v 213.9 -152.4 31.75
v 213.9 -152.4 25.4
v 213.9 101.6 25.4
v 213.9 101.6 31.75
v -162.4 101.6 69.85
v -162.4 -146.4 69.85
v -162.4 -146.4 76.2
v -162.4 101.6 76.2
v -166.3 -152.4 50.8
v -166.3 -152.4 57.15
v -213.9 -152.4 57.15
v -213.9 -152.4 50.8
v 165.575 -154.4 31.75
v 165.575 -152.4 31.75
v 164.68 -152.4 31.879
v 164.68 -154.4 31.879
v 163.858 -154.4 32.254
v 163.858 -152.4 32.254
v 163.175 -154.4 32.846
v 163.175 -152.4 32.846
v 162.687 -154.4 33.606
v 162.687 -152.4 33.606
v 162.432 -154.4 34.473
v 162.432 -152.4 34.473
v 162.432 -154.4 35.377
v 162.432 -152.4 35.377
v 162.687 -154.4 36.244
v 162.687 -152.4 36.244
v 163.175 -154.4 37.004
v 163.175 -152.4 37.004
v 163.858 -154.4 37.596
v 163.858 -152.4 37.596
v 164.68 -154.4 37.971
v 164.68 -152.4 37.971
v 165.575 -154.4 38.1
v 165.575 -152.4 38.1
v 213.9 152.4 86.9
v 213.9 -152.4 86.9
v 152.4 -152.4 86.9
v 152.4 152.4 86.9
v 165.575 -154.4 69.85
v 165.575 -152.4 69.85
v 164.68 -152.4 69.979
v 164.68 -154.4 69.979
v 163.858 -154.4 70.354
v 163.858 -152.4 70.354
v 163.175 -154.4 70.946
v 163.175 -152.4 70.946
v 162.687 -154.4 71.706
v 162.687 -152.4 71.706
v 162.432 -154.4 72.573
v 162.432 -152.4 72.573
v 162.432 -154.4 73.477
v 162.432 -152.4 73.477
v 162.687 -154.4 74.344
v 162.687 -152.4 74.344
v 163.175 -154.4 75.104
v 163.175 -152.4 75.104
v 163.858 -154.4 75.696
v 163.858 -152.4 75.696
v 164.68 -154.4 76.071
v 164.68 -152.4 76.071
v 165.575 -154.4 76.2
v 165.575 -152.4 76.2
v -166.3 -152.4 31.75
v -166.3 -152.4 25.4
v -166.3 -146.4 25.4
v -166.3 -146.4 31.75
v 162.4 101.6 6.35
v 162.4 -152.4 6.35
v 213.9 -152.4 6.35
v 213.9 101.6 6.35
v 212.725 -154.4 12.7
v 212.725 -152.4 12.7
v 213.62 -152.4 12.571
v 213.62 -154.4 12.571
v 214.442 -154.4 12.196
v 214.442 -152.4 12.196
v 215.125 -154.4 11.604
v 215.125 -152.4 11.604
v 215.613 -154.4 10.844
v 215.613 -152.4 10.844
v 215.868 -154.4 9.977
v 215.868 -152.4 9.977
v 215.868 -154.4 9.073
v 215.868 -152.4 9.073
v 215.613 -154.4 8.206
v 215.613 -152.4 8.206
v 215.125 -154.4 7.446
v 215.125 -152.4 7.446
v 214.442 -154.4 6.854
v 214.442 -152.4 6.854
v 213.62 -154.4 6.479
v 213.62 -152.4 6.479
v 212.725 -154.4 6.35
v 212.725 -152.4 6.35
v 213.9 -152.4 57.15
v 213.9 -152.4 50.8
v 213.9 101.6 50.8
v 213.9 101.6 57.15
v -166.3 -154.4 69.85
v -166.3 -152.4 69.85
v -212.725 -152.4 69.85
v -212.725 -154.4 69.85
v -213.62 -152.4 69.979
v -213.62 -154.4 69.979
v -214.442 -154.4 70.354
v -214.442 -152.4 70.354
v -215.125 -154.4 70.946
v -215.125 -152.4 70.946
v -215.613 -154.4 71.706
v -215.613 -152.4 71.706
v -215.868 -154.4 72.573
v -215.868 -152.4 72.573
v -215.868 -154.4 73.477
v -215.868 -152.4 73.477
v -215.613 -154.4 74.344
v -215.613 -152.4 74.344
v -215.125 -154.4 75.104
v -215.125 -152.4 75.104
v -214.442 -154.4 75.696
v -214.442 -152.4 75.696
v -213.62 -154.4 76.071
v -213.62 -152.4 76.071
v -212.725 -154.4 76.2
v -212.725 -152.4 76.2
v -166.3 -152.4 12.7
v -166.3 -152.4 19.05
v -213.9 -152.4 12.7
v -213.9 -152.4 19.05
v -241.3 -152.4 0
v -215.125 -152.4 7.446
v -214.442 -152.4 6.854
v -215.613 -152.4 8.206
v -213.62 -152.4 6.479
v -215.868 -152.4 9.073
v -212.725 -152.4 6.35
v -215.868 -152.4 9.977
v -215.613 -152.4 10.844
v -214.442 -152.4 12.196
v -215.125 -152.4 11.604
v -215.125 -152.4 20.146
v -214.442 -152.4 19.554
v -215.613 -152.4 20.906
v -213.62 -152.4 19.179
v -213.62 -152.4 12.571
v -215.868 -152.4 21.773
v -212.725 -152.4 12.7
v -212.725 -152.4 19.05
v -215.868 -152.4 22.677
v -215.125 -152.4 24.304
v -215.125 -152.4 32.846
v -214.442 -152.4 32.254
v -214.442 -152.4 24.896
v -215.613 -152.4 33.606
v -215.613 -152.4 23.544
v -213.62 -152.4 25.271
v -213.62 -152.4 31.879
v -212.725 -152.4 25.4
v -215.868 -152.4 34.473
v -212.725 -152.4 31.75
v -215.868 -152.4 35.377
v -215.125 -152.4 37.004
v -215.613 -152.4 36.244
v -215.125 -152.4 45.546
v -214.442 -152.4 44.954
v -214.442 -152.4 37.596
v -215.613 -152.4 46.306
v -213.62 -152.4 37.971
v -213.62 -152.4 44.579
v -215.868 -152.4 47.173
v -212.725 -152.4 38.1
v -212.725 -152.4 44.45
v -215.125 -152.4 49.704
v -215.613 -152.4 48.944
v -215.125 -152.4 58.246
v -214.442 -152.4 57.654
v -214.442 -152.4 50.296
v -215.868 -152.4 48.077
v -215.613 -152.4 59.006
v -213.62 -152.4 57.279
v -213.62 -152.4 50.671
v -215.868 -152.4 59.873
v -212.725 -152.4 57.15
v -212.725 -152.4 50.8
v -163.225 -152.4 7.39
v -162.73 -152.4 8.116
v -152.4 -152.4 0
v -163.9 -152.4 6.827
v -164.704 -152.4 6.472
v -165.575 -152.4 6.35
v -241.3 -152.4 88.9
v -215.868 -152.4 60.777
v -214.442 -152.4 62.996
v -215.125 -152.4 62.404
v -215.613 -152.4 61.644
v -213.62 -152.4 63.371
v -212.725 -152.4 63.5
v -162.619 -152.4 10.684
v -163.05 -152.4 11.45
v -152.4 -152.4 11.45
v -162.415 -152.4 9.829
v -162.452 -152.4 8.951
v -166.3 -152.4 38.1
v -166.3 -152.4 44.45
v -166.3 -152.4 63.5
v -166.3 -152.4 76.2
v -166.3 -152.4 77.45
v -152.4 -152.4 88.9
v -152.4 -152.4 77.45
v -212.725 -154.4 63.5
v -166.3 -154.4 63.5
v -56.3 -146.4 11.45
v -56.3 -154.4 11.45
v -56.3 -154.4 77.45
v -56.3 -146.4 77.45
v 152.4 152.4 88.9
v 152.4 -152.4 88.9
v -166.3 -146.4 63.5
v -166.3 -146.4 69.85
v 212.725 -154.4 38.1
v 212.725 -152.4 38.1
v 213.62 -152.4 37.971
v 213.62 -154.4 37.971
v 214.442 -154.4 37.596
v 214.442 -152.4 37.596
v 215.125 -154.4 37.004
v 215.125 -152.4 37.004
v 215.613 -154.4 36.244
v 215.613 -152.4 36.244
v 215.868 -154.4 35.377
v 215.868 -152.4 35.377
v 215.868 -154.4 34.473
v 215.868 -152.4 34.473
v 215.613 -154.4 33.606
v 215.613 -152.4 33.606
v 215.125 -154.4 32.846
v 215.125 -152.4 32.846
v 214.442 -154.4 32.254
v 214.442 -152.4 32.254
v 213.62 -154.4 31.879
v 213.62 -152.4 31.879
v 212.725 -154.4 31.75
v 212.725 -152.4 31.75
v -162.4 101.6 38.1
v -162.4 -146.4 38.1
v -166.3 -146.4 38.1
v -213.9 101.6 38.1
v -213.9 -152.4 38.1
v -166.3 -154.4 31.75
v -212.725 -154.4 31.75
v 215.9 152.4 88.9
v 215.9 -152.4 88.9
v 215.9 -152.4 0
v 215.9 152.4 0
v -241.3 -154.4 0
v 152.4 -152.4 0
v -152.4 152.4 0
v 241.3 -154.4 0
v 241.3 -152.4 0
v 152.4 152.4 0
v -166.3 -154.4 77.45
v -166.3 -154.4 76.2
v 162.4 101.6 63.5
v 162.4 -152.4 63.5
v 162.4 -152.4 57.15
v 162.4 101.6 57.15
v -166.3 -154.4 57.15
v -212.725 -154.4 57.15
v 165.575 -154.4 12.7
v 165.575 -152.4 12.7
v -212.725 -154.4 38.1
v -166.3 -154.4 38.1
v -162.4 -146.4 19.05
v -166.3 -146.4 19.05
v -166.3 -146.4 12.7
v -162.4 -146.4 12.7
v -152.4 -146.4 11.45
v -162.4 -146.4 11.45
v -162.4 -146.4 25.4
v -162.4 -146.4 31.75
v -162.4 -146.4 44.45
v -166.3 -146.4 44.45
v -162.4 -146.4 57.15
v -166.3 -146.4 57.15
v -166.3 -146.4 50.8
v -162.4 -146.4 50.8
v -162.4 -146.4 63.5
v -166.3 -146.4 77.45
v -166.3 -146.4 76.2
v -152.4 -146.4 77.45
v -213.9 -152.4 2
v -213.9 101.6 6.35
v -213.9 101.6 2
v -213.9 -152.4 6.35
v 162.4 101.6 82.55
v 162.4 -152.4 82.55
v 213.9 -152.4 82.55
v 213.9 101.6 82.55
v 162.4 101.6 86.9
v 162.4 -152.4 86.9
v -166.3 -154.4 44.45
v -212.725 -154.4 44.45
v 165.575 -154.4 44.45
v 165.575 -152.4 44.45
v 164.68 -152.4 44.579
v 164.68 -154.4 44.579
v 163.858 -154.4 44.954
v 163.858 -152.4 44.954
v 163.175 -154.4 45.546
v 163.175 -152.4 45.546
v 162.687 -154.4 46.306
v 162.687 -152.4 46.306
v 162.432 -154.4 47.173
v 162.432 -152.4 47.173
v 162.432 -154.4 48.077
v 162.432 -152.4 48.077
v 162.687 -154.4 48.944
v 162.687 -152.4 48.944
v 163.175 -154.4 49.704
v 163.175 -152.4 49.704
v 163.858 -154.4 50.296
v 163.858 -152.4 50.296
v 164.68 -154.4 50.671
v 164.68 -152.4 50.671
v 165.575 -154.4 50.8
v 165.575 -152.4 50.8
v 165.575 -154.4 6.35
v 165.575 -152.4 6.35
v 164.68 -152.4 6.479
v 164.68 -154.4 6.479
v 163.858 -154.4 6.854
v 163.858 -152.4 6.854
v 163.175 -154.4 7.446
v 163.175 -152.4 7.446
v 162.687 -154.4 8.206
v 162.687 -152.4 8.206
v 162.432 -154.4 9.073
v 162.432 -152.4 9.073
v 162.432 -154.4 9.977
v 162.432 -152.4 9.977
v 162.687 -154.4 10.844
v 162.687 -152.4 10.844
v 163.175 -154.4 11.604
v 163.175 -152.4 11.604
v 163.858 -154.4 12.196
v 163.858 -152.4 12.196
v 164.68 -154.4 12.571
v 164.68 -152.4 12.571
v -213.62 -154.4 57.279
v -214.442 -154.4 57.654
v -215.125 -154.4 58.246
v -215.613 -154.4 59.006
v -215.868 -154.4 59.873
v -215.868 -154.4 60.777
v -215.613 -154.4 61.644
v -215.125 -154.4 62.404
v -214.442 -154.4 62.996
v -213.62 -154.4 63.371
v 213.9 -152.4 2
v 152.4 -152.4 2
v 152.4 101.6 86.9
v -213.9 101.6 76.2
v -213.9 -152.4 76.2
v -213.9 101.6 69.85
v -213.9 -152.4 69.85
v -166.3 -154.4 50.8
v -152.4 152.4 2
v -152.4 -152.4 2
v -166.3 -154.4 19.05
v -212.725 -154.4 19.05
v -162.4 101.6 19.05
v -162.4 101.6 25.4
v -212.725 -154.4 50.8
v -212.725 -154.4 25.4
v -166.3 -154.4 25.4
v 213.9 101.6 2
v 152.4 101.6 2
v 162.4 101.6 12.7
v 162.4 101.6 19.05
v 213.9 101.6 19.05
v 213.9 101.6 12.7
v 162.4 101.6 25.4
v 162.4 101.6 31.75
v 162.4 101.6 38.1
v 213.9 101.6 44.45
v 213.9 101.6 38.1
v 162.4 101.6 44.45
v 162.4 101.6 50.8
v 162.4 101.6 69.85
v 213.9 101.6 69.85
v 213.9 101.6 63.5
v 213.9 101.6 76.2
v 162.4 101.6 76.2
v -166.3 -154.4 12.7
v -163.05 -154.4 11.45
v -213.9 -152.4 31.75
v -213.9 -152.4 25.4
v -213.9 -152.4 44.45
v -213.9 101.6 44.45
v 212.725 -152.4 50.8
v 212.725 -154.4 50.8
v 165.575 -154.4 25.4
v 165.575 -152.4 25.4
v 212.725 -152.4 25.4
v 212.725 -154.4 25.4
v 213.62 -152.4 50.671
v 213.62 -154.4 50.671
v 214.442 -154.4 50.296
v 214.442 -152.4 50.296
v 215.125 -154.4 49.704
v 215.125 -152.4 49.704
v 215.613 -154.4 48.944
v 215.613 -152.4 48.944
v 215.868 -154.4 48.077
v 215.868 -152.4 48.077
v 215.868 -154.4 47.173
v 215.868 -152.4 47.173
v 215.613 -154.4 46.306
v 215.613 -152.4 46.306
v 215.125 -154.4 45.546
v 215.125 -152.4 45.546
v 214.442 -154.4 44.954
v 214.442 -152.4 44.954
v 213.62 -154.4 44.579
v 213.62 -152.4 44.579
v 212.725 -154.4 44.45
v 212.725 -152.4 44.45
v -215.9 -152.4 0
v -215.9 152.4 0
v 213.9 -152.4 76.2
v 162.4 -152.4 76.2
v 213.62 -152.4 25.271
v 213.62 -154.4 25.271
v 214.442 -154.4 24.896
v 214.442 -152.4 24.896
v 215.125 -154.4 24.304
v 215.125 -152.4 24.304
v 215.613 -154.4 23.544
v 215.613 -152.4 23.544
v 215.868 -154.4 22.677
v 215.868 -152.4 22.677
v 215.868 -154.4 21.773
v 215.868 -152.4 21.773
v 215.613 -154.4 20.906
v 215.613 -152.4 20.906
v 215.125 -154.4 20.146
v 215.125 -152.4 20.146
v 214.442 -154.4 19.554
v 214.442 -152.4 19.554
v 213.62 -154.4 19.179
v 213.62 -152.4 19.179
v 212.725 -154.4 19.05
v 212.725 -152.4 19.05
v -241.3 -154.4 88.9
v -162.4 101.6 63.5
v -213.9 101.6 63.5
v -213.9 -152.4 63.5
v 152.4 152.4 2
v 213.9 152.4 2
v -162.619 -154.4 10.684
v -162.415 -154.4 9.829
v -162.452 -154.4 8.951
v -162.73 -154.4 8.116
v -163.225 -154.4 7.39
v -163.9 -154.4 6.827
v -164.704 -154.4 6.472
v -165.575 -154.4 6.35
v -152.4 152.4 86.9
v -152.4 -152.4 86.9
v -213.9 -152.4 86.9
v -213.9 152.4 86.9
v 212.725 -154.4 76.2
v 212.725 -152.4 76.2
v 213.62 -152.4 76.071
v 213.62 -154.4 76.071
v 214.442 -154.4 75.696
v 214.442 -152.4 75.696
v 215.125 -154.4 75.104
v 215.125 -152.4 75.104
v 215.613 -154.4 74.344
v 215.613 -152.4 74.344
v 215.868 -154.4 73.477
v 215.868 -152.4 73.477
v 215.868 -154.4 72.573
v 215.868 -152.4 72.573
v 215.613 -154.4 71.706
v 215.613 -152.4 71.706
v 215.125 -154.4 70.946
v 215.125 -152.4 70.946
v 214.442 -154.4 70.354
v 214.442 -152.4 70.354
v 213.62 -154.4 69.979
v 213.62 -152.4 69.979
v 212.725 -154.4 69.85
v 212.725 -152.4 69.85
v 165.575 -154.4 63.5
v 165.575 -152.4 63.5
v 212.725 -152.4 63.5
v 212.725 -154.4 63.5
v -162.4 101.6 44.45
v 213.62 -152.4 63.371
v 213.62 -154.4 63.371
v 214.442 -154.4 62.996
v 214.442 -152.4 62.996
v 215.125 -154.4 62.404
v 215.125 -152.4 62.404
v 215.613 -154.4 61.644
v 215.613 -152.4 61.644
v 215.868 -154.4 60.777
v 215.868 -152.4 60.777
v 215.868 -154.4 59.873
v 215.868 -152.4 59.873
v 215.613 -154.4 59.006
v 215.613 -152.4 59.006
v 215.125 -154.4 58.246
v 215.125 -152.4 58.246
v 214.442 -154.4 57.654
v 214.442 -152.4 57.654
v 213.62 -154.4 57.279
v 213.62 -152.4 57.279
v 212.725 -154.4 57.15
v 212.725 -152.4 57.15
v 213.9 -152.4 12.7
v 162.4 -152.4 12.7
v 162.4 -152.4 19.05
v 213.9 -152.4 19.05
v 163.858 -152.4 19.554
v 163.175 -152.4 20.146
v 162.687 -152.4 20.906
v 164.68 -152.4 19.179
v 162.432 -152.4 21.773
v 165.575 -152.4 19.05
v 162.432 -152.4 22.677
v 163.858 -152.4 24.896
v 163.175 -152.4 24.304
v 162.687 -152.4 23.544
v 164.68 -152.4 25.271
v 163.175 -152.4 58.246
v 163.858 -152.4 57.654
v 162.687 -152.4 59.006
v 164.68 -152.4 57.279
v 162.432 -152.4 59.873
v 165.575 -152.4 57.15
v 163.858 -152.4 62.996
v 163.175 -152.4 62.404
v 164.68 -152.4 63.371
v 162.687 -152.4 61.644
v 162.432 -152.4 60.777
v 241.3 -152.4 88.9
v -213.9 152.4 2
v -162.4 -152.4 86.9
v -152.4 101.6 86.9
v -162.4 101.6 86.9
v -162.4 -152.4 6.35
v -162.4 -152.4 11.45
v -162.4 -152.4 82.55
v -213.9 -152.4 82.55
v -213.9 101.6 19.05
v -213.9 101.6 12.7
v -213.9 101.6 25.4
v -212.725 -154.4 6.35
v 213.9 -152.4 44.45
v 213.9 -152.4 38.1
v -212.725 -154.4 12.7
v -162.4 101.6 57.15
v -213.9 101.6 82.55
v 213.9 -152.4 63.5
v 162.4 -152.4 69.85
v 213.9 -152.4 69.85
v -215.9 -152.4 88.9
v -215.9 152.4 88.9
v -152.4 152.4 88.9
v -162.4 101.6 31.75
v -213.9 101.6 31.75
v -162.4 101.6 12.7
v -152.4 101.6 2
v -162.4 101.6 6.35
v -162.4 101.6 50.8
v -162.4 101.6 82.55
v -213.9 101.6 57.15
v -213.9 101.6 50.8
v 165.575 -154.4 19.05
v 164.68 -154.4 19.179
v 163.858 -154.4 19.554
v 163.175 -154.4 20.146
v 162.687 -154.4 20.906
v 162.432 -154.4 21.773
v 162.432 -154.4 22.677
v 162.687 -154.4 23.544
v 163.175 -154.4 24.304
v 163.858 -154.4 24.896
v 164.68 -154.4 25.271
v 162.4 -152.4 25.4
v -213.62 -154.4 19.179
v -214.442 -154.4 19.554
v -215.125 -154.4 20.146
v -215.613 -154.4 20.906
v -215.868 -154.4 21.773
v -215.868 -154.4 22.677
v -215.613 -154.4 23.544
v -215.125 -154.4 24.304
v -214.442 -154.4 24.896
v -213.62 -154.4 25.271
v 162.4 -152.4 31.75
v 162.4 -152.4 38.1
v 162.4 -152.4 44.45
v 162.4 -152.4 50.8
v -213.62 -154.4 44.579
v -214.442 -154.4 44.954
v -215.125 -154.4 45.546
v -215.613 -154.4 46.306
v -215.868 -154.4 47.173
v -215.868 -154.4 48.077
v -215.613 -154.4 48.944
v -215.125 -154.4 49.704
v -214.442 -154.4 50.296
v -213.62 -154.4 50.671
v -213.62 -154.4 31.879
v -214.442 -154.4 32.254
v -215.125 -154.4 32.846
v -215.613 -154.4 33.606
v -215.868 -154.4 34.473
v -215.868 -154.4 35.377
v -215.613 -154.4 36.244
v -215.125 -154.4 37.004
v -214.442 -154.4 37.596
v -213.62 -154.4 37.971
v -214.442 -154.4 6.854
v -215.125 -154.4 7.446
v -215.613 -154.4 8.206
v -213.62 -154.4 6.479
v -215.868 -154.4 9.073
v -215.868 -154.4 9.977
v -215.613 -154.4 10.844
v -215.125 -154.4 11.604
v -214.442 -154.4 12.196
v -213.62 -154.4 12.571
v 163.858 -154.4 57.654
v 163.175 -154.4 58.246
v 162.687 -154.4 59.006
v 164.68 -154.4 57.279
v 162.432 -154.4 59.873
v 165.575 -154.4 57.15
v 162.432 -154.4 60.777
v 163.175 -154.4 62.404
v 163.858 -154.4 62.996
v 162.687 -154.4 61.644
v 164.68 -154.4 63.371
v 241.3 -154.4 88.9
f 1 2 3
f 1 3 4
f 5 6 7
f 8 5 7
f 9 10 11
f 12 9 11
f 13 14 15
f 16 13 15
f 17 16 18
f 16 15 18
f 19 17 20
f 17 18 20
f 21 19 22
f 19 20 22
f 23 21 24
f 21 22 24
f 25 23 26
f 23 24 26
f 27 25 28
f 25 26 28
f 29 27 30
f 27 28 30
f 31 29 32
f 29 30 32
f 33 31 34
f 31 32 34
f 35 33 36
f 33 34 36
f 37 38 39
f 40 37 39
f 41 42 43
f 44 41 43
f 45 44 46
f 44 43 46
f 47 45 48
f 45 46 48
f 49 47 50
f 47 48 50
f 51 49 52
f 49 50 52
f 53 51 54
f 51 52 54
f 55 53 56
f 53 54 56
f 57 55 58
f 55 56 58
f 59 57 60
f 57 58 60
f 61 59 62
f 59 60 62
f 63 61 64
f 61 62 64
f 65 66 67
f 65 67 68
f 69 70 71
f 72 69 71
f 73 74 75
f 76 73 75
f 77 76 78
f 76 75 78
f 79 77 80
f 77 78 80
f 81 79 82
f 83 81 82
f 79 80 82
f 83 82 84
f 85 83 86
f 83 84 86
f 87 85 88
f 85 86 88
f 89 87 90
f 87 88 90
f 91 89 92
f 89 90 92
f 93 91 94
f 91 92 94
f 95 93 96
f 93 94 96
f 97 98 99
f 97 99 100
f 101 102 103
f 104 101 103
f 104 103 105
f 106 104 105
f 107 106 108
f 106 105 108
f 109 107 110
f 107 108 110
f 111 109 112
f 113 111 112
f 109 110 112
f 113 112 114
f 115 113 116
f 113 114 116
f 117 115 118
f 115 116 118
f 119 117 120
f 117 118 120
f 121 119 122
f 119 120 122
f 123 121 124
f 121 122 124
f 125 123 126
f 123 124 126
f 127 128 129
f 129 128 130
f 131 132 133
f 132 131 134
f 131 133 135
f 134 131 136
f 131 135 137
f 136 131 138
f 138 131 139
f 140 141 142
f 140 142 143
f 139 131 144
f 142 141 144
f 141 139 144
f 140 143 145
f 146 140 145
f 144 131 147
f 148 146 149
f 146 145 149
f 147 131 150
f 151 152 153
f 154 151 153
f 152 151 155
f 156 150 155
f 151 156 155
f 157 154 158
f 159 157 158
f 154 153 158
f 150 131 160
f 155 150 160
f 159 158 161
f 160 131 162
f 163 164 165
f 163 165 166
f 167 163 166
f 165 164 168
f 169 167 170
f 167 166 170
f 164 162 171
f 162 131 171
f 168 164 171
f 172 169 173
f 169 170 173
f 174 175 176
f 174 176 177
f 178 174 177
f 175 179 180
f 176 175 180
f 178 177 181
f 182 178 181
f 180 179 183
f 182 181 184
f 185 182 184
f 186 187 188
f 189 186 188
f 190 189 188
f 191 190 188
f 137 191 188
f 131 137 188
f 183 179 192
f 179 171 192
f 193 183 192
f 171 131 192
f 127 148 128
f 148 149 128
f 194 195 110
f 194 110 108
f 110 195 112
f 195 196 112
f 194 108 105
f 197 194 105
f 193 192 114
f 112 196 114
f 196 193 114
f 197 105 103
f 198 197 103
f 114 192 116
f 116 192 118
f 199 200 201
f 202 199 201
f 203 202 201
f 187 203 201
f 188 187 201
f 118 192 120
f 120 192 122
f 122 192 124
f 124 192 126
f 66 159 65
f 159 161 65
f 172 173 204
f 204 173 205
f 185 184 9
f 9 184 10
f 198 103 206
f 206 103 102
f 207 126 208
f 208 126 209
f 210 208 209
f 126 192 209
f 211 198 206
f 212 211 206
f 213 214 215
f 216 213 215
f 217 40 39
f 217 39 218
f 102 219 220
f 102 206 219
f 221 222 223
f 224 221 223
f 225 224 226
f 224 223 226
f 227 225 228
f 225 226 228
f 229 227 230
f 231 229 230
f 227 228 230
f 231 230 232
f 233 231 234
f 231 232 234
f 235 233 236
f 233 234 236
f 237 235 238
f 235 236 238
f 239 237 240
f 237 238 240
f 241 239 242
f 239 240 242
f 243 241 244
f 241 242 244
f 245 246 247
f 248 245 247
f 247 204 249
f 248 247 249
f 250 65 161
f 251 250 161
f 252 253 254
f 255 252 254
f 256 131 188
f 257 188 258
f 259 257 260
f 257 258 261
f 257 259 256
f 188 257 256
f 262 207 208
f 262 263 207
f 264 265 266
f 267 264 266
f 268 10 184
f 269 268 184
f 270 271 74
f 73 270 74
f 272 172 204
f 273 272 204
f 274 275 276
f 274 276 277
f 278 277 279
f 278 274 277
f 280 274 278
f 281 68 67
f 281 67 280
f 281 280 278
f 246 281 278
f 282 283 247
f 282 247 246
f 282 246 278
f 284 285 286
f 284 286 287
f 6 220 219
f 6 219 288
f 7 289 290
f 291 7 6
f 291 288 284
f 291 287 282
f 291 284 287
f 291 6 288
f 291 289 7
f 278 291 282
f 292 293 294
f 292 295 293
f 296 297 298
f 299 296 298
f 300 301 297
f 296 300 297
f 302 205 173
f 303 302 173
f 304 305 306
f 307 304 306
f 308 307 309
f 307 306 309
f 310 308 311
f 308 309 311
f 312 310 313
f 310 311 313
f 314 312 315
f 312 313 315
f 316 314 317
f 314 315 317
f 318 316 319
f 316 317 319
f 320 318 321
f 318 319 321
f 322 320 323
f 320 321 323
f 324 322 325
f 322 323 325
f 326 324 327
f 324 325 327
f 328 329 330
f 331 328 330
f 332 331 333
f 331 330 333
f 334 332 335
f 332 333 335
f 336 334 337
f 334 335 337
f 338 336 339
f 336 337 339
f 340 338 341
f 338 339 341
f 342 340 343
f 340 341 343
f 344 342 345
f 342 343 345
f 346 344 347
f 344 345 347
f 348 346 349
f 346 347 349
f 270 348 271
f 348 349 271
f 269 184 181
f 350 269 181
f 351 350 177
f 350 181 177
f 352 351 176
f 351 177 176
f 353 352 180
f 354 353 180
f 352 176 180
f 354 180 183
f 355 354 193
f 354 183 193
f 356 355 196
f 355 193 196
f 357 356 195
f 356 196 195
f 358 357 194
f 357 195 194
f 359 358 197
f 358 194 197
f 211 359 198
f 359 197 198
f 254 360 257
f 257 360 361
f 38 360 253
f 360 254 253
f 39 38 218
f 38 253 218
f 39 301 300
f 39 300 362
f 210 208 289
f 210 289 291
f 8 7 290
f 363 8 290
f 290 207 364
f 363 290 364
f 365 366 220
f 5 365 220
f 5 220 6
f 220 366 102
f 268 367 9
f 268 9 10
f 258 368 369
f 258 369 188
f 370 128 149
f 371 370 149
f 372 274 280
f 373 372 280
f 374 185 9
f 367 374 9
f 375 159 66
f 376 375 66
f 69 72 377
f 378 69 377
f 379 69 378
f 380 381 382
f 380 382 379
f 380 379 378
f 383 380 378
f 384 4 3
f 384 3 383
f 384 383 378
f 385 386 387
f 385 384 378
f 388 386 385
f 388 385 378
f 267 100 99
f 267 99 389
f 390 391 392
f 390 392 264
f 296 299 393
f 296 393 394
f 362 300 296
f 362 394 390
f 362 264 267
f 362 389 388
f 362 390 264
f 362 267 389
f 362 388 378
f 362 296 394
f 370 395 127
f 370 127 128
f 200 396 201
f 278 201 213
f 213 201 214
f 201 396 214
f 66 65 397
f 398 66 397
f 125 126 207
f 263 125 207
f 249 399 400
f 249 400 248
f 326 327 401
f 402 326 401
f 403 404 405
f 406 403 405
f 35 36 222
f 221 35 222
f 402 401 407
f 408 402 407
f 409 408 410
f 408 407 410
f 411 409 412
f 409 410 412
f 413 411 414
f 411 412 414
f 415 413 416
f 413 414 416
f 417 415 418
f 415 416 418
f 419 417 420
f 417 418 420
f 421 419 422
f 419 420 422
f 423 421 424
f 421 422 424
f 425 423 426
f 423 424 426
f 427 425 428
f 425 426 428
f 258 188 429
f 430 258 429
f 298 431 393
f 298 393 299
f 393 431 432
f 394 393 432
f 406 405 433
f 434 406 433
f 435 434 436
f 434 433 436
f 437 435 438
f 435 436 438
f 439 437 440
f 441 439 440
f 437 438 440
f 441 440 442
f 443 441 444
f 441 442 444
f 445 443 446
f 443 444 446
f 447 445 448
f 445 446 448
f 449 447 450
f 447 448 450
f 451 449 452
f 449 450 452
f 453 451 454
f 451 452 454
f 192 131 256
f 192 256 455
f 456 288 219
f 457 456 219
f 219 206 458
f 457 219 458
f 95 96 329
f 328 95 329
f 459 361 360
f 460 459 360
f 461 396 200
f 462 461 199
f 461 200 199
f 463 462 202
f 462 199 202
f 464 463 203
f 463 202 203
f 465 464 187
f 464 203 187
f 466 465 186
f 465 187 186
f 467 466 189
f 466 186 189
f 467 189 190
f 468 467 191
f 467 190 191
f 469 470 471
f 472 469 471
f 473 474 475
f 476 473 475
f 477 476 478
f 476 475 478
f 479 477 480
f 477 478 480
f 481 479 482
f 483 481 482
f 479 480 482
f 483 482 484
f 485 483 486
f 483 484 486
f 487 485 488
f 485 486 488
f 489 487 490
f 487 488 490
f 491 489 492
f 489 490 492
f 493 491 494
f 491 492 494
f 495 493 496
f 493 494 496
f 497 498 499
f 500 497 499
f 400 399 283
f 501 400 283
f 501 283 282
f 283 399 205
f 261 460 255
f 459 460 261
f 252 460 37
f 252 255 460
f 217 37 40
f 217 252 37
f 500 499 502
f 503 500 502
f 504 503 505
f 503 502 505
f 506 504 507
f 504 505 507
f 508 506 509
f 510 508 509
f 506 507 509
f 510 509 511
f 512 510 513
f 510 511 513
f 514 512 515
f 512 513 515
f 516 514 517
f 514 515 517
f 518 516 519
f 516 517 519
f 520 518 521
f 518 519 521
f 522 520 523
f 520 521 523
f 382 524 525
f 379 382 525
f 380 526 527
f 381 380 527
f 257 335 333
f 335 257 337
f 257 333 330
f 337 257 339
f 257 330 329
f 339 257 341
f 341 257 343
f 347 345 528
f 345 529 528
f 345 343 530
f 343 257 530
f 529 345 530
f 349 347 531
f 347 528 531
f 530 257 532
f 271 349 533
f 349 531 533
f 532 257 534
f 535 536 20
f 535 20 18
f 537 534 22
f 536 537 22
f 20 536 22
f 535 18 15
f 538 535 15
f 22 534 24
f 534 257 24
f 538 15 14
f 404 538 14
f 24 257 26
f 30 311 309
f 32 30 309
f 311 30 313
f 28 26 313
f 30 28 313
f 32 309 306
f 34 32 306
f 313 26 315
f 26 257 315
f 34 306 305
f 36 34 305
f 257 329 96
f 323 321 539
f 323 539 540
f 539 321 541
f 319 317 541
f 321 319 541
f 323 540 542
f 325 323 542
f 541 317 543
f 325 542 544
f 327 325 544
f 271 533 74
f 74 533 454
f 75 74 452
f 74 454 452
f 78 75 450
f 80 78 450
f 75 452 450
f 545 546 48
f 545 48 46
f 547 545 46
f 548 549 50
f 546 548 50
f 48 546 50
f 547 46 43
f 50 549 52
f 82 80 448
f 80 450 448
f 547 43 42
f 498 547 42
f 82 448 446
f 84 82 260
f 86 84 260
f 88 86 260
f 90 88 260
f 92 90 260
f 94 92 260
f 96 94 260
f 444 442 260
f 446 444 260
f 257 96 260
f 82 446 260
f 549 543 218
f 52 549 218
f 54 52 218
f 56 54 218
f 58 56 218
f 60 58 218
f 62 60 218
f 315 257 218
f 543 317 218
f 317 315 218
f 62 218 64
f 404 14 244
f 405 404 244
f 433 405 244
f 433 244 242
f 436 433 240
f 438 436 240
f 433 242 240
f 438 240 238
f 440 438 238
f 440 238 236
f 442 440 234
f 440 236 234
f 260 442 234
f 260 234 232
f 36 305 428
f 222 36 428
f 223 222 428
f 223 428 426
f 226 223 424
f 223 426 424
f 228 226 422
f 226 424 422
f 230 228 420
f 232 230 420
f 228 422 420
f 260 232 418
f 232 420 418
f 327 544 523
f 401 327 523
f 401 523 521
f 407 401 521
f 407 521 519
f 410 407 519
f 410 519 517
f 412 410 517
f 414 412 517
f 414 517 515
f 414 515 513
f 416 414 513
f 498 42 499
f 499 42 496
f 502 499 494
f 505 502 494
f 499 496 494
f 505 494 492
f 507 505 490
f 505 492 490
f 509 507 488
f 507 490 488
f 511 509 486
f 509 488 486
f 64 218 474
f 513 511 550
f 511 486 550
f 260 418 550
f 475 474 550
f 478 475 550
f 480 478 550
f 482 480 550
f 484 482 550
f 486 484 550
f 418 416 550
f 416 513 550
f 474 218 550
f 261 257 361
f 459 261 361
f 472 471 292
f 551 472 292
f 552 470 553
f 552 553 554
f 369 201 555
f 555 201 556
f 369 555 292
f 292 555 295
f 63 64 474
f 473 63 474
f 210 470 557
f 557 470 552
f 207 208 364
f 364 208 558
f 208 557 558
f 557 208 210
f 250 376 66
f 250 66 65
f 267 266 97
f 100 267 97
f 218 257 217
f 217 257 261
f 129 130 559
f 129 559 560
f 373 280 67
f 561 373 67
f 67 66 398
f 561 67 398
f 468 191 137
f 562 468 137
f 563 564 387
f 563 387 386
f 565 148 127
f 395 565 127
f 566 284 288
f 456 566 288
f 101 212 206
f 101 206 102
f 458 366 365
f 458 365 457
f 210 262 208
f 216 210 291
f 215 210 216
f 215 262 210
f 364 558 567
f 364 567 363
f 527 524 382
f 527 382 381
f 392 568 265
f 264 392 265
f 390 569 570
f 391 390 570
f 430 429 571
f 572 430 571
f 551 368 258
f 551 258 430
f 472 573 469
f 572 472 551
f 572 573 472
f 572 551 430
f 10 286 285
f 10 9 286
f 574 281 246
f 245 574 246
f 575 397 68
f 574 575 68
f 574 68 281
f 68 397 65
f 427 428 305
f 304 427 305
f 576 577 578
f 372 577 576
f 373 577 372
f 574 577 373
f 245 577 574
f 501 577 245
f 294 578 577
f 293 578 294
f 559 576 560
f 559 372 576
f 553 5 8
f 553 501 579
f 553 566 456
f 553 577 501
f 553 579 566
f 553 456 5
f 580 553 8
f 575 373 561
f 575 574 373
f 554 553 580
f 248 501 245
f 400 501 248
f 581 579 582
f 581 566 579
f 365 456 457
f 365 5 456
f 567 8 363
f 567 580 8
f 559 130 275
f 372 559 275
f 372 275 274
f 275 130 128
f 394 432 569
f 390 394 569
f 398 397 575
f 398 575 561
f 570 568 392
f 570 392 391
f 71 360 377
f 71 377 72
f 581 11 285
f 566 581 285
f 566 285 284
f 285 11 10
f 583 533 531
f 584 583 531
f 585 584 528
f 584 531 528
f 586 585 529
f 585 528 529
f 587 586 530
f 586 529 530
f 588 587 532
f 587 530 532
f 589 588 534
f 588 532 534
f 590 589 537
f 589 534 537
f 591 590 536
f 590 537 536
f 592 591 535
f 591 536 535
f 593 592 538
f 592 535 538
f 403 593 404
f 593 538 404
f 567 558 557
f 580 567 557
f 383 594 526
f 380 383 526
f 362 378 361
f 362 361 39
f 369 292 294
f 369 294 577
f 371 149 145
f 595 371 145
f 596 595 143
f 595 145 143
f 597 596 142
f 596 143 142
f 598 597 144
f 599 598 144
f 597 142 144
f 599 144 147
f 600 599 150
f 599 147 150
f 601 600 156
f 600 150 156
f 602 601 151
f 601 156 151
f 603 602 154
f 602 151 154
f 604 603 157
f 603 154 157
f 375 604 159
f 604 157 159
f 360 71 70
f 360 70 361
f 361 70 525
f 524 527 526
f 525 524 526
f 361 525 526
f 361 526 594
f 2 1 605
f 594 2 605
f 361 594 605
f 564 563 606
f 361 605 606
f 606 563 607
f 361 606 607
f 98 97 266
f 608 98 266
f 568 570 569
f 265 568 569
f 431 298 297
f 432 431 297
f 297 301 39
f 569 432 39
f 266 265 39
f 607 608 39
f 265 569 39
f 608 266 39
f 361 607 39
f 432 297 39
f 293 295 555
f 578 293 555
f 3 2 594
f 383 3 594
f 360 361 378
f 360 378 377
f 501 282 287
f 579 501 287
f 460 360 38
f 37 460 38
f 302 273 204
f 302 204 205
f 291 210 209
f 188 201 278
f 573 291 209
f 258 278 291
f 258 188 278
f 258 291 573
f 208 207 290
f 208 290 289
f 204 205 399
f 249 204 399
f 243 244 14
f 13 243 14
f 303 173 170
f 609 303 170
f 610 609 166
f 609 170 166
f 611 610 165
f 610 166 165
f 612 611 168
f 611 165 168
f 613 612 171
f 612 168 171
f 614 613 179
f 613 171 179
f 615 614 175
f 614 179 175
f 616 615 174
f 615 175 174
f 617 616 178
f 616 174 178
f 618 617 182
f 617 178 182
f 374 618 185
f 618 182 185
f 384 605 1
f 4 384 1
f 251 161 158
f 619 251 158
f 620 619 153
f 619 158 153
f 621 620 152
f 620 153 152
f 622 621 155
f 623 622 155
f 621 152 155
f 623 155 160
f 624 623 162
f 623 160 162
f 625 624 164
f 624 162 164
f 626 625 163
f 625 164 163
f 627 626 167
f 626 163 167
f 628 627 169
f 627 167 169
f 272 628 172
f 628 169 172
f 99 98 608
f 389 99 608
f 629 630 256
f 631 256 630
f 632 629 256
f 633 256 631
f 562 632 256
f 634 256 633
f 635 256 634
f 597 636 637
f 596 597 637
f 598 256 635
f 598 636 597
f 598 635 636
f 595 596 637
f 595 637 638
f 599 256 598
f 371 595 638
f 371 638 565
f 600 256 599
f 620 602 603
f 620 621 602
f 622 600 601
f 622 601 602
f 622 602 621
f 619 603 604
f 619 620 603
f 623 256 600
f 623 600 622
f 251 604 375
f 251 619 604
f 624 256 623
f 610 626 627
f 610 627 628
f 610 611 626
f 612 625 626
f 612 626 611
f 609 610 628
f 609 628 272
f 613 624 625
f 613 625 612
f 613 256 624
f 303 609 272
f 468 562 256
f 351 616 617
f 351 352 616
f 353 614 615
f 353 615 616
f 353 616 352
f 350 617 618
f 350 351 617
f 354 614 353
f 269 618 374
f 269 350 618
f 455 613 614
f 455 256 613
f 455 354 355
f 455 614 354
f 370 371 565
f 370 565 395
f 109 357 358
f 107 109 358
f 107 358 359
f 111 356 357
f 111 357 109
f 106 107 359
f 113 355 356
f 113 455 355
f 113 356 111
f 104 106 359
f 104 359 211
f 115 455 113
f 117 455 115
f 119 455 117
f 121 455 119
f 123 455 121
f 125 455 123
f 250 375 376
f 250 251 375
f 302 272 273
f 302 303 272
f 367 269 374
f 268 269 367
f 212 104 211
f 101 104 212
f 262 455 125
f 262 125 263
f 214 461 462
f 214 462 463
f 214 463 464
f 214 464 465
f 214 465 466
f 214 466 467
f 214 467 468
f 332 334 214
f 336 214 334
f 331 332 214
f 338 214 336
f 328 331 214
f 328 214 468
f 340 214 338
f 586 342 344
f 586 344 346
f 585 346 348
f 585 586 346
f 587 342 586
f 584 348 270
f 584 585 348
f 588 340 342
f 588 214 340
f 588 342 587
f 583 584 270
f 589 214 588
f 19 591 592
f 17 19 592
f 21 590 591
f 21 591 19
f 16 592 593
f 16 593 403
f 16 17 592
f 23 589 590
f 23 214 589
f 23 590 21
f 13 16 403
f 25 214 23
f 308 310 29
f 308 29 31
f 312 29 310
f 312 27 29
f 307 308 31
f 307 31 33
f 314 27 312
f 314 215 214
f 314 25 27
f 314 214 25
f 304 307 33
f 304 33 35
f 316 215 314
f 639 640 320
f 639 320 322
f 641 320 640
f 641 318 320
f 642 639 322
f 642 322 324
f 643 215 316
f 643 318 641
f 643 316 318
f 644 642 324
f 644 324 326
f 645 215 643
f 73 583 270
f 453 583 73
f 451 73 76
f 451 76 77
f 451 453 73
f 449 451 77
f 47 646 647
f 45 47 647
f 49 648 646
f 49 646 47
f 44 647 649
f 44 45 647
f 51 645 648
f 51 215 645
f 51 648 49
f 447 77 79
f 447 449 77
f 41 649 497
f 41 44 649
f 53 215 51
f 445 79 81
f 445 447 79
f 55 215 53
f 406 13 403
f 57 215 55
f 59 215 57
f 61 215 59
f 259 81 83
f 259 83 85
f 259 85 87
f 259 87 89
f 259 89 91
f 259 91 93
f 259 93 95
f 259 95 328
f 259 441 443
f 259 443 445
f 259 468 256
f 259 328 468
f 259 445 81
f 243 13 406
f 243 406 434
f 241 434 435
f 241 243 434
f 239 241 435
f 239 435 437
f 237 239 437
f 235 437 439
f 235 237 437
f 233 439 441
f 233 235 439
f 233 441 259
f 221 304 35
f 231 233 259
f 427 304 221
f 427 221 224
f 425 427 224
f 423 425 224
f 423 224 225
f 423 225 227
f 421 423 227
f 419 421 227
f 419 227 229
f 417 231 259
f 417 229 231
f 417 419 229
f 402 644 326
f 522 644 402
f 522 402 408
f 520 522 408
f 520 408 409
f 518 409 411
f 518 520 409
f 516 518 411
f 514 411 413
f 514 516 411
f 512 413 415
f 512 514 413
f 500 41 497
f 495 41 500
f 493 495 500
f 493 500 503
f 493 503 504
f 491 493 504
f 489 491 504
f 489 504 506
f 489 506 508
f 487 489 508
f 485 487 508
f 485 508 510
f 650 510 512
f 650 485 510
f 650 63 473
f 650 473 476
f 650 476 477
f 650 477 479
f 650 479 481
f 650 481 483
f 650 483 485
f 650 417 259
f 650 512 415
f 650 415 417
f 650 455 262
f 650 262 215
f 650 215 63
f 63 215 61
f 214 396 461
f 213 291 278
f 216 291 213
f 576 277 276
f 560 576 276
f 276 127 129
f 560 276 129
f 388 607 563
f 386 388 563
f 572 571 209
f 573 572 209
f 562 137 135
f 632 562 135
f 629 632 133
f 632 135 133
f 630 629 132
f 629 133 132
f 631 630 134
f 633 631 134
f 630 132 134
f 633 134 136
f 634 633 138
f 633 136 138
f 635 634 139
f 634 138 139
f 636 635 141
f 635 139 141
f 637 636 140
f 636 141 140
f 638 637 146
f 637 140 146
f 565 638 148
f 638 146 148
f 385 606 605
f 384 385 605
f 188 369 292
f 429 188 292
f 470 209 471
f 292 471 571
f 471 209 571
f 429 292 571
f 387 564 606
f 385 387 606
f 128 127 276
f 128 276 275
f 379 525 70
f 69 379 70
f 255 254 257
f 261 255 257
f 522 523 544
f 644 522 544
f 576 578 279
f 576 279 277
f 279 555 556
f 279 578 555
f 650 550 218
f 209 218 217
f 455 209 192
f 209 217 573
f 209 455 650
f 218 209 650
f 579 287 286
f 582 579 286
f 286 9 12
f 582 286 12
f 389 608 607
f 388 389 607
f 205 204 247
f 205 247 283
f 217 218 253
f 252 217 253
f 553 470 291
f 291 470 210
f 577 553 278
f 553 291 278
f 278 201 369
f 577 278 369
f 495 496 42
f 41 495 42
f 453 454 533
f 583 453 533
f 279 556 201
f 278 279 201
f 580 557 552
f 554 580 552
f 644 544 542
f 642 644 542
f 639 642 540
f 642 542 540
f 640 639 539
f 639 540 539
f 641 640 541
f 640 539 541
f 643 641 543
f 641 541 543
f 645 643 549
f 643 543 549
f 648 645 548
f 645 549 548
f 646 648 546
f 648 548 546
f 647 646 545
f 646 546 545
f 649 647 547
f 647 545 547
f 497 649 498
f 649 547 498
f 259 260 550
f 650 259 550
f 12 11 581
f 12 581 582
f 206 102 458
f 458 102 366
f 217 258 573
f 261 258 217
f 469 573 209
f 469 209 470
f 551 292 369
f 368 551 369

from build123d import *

# Parameters (mm, degrees)
F0_W      = 304.8
F0_H      = 304.8
F1_DEPTH  = 88.9
F2_W      = 88.9
F2_H      = 88.9
F2_W_2    = 304.8
F3_DEPTH  = 2
F5_DEPTH  = 254
F7_DEPTH  = 2.001
F9_DEPTH  = 304.801
F10_DEPTH = 304.8
F11_W     = 110
F11_H     = 66
F12_DEPTH = 8


with BuildPart() as f1:
    # F0 (on Top) → F1 (new body)
    with BuildSketch(Plane.XY):
        Rectangle(F0_W, F0_H)
    extrude(amount=F1_DEPTH)

    # F2 (on face) → F3 (join)
    with BuildSketch(Plane.XZ.offset(152.4)):
        with Locations((-196.85, 44.45)):
            Rectangle(F2_W, F2_H)
        with Locations((0, 44.45)):
            Rectangle(F2_W_2, F2_H)
        with Locations((196.85, 44.45)):
            Rectangle(F2_W, F2_H)
    extrude(amount=F3_DEPTH)

    # F6 (on face) → F7 (cut, through all)
    with BuildSketch(Plane(origin=(0, -152.4, 0), x_dir=(-1, 0, 0), z_dir=(0, 1, 0))):
        with BuildLine():
            Line((-165.575, 76.2), (-212.725, 76.2))
            ThreePointArc((-212.725, 76.2), (-215.9, 73.025), (-212.725, 69.85))
            Line((-212.725, 69.85), (-165.575, 69.85))
            ThreePointArc((-165.575, 69.85), (-162.4, 73.025), (-165.575, 76.2))
        make_face()
        with BuildLine():
            Line((-165.575, 63.5), (-212.725, 63.5))
            ThreePointArc((-212.725, 63.5), (-215.9, 60.325), (-212.725, 57.15))
            Line((-212.725, 57.15), (-165.575, 57.15))
            ThreePointArc((-165.575, 57.15), (-162.4, 60.325), (-165.575, 63.5))
        make_face()
        with BuildLine():
            Line((-165.575, 50.8), (-212.725, 50.8))
            ThreePointArc((-212.725, 50.8), (-215.9, 47.625), (-212.725, 44.45))
            Line((-212.725, 44.45), (-165.575, 44.45))
            ThreePointArc((-165.575, 44.45), (-162.4, 47.625), (-165.575, 50.8))
        make_face()
        with BuildLine():
            Line((-165.575, 38.1), (-212.725, 38.1))
            ThreePointArc((-212.725, 38.1), (-215.9, 34.925), (-212.725, 31.75))
            Line((-212.725, 31.75), (-165.575, 31.75))
            ThreePointArc((-165.575, 31.75), (-162.4, 34.925), (-165.575, 38.1))
        make_face()
        with BuildLine():
            Line((-165.575, 25.4), (-212.725, 25.4))
            ThreePointArc((-212.725, 25.4), (-215.9, 22.225), (-212.725, 19.05))
            Line((-212.725, 19.05), (-165.575, 19.05))
            ThreePointArc((-165.575, 19.05), (-162.4, 22.225), (-165.575, 25.4))
        make_face()
        with BuildLine():
            Line((-165.575, 12.7), (-212.725, 12.7))
            ThreePointArc((-212.725, 12.7), (-215.9, 9.525), (-212.725, 6.35))
            Line((-212.725, 6.35), (-165.575, 6.35))
            ThreePointArc((-165.575, 6.35), (-162.4, 9.525), (-165.575, 12.7))
        make_face()
        with BuildLine():
            ThreePointArc((212.725, 31.75), (215.9, 34.925), (212.725, 38.1))
            Line((212.725, 38.1), (165.575, 38.1))
            ThreePointArc((165.575, 38.1), (162.4, 34.925), (165.575, 31.75))
            Line((165.575, 31.75), (212.725, 31.75))
        make_face()
        with BuildLine():
            Line((165.575, 6.35), (212.725, 6.35))
            ThreePointArc((212.725, 6.35), (215.9, 9.525), (212.725, 12.7))
            Line((212.725, 12.7), (165.575, 12.7))
            ThreePointArc((165.575, 12.7), (162.4, 9.525), (165.575, 6.35))
        make_face()
        with BuildLine():
            ThreePointArc((165.575, 50.8), (162.4, 47.625), (165.575, 44.45))
            Line((165.575, 44.45), (212.725, 44.45))
            ThreePointArc((212.725, 44.45), (215.9, 47.625), (212.725, 50.8))
            Line((212.725, 50.8), (165.575, 50.8))
        make_face()
        with BuildLine():
            ThreePointArc((165.575, 63.5), (162.4, 60.325), (165.575, 57.15))
            Line((165.575, 57.15), (212.725, 57.15))
            ThreePointArc((212.725, 57.15), (215.9, 60.325), (212.725, 63.5))
            Line((212.725, 63.5), (165.575, 63.5))
        make_face()
        with BuildLine():
            ThreePointArc((212.725, 69.85), (215.9, 73.025), (212.725, 76.2))
            Line((212.725, 76.2), (165.575, 76.2))
            ThreePointArc((165.575, 76.2), (162.4, 73.025), (165.575, 69.85))
            Line((165.575, 69.85), (212.725, 69.85))
        make_face()
        with BuildLine():
            Line((165.575, 19.05), (212.725, 19.05))
            ThreePointArc((212.725, 19.05), (215.9, 22.225), (212.725, 25.4))
            Line((212.725, 25.4), (165.575, 25.4))
            ThreePointArc((165.575, 25.4), (162.4, 22.225), (165.575, 19.05))
        make_face()
    extrude(amount=-F7_DEPTH, mode=Mode.SUBTRACT)


with BuildPart() as f5:
    # F4 (on face) → F5 (new body)
    with BuildSketch(Plane(origin=(0, -152.4, 0), x_dir=(-1, 0, 0), z_dir=(0, 1, 0))):
        Polygon((-152.4, 0), (-152.4, 88.9), (-162.4, 88.9), (-162.4, 82.55), (-215.9, 82.55), (-215.9, 76.2), (-162.4, 76.2), (-162.4, 69.85), (-215.9, 69.85), (-215.9, 63.5), (-162.4, 63.5), (-162.4, 57.15), (-215.9, 57.15), (-215.9, 50.8), (-162.4, 50.8), (-162.4, 44.45), (-215.9, 44.45), (-215.9, 38.1), (-162.4, 38.1), (-162.4, 31.75), (-215.9, 31.75), (-215.9, 25.4), (-162.4, 25.4), (-162.4, 19.05), (-215.9, 19.05), (-215.9, 12.7), (-162.4, 12.7), (-162.4, 6.35), (-215.9, 6.35), (-215.9, 0), (-162.4, 0), align=None)
    extrude(amount=F5_DEPTH)


with BuildPart() as f5b:
    # F4 (on face) → F5, piece 2 (new body)
    with BuildSketch(Plane(origin=(0, -152.4, 0), x_dir=(-1, 0, 0), z_dir=(0, 1, 0))):
        Polygon((215.9, 63.5), (215.9, 69.85), (162.4, 69.85), (162.4, 76.2), (215.9, 76.2), (215.9, 82.55), (162.4, 82.55), (162.4, 88.9), (152.4, 88.9), (152.4, 0), (162.4, 0), (215.9, 0), (215.9, 6.35), (162.4, 6.35), (162.4, 12.7), (215.9, 12.7), (215.9, 19.05), (162.4, 19.05), (162.4, 25.4), (215.9, 25.4), (215.9, 31.75), (162.4, 31.75), (162.4, 38.1), (215.9, 38.1), (215.9, 44.45), (162.4, 44.45), (162.4, 50.8), (215.9, 50.8), (215.9, 57.15), (162.4, 57.15), (162.4, 63.5), align=None)
    extrude(amount=F5_DEPTH)


with BuildPart() as f9_tool:
    # F8 (on face) → F9 (new body, through all)
    with BuildSketch(Plane(origin=(0, -152.4, 0), x_dir=(-1, 0, 0), z_dir=(0, 1, 0))):
        Polygon((-152.4, 86.9), (-152.4, 88.9), (-215.9, 88.9), (-215.9, 0), (-152.4, 0), (-152.4, 2), (-213.9, 2), (-213.9, 86.9), align=None)
        Polygon((215.9, 88.9), (152.4, 88.9), (152.4, 86.9), (213.9, 86.9), (213.9, 2), (152.4, 2), (152.4, 0), (215.9, 0), align=None)
    extrude(amount=F9_DEPTH)


with BuildPart() as f5_1:
    add(f5.part)

    # F9: cut by f9_tool
    add(f9_tool.part, mode=Mode.SUBTRACT)


with BuildPart() as f5b_1:
    add(f5b.part)

    # F9: cut by f9_tool
    add(f9_tool.part, mode=Mode.SUBTRACT)


with BuildPart() as f10:
    # F8 (on face) → F10 (new body)
    with BuildSketch(Plane(origin=(0, -152.4, 0), x_dir=(-1, 0, 0), z_dir=(0, 1, 0))):
        Polygon((-152.4, 86.9), (-152.4, 88.9), (-215.9, 88.9), (-215.9, 0), (-152.4, 0), (-152.4, 2), (-213.9, 2), (-213.9, 86.9), align=None)
    extrude(amount=F10_DEPTH)


with BuildPart() as f10b:
    # F8 (on face) → F10, piece 2 (new body)
    with BuildSketch(Plane(origin=(0, -152.4, 0), x_dir=(-1, 0, 0), z_dir=(0, 1, 0))):
        Polygon((215.9, 88.9), (152.4, 88.9), (152.4, 86.9), (213.9, 86.9), (213.9, 2), (152.4, 2), (152.4, 0), (215.9, 0), align=None)
    extrude(amount=F10_DEPTH)


with BuildPart() as f12_tool:
    # F11 (on face) → F12 (new body)
    with BuildSketch(Plane.XZ.offset(154.4)):
        with Locations((-111.3, 44.45)):
            Rectangle(F11_W, F11_H)
    extrude(amount=-F12_DEPTH)


with BuildPart() as f1_1:
    add(f1.part)

    # F12: cut by f12_tool
    add(f12_tool.part, mode=Mode.SUBTRACT)


with BuildPart() as f5b_2:
    add(f5b_1.part)

    # F12: cut by f12_tool
    add(f12_tool.part, mode=Mode.SUBTRACT)


solid = Compound([f5_1.part, f10.part, f10b.part, f1_1.part, f5b_2.part])
